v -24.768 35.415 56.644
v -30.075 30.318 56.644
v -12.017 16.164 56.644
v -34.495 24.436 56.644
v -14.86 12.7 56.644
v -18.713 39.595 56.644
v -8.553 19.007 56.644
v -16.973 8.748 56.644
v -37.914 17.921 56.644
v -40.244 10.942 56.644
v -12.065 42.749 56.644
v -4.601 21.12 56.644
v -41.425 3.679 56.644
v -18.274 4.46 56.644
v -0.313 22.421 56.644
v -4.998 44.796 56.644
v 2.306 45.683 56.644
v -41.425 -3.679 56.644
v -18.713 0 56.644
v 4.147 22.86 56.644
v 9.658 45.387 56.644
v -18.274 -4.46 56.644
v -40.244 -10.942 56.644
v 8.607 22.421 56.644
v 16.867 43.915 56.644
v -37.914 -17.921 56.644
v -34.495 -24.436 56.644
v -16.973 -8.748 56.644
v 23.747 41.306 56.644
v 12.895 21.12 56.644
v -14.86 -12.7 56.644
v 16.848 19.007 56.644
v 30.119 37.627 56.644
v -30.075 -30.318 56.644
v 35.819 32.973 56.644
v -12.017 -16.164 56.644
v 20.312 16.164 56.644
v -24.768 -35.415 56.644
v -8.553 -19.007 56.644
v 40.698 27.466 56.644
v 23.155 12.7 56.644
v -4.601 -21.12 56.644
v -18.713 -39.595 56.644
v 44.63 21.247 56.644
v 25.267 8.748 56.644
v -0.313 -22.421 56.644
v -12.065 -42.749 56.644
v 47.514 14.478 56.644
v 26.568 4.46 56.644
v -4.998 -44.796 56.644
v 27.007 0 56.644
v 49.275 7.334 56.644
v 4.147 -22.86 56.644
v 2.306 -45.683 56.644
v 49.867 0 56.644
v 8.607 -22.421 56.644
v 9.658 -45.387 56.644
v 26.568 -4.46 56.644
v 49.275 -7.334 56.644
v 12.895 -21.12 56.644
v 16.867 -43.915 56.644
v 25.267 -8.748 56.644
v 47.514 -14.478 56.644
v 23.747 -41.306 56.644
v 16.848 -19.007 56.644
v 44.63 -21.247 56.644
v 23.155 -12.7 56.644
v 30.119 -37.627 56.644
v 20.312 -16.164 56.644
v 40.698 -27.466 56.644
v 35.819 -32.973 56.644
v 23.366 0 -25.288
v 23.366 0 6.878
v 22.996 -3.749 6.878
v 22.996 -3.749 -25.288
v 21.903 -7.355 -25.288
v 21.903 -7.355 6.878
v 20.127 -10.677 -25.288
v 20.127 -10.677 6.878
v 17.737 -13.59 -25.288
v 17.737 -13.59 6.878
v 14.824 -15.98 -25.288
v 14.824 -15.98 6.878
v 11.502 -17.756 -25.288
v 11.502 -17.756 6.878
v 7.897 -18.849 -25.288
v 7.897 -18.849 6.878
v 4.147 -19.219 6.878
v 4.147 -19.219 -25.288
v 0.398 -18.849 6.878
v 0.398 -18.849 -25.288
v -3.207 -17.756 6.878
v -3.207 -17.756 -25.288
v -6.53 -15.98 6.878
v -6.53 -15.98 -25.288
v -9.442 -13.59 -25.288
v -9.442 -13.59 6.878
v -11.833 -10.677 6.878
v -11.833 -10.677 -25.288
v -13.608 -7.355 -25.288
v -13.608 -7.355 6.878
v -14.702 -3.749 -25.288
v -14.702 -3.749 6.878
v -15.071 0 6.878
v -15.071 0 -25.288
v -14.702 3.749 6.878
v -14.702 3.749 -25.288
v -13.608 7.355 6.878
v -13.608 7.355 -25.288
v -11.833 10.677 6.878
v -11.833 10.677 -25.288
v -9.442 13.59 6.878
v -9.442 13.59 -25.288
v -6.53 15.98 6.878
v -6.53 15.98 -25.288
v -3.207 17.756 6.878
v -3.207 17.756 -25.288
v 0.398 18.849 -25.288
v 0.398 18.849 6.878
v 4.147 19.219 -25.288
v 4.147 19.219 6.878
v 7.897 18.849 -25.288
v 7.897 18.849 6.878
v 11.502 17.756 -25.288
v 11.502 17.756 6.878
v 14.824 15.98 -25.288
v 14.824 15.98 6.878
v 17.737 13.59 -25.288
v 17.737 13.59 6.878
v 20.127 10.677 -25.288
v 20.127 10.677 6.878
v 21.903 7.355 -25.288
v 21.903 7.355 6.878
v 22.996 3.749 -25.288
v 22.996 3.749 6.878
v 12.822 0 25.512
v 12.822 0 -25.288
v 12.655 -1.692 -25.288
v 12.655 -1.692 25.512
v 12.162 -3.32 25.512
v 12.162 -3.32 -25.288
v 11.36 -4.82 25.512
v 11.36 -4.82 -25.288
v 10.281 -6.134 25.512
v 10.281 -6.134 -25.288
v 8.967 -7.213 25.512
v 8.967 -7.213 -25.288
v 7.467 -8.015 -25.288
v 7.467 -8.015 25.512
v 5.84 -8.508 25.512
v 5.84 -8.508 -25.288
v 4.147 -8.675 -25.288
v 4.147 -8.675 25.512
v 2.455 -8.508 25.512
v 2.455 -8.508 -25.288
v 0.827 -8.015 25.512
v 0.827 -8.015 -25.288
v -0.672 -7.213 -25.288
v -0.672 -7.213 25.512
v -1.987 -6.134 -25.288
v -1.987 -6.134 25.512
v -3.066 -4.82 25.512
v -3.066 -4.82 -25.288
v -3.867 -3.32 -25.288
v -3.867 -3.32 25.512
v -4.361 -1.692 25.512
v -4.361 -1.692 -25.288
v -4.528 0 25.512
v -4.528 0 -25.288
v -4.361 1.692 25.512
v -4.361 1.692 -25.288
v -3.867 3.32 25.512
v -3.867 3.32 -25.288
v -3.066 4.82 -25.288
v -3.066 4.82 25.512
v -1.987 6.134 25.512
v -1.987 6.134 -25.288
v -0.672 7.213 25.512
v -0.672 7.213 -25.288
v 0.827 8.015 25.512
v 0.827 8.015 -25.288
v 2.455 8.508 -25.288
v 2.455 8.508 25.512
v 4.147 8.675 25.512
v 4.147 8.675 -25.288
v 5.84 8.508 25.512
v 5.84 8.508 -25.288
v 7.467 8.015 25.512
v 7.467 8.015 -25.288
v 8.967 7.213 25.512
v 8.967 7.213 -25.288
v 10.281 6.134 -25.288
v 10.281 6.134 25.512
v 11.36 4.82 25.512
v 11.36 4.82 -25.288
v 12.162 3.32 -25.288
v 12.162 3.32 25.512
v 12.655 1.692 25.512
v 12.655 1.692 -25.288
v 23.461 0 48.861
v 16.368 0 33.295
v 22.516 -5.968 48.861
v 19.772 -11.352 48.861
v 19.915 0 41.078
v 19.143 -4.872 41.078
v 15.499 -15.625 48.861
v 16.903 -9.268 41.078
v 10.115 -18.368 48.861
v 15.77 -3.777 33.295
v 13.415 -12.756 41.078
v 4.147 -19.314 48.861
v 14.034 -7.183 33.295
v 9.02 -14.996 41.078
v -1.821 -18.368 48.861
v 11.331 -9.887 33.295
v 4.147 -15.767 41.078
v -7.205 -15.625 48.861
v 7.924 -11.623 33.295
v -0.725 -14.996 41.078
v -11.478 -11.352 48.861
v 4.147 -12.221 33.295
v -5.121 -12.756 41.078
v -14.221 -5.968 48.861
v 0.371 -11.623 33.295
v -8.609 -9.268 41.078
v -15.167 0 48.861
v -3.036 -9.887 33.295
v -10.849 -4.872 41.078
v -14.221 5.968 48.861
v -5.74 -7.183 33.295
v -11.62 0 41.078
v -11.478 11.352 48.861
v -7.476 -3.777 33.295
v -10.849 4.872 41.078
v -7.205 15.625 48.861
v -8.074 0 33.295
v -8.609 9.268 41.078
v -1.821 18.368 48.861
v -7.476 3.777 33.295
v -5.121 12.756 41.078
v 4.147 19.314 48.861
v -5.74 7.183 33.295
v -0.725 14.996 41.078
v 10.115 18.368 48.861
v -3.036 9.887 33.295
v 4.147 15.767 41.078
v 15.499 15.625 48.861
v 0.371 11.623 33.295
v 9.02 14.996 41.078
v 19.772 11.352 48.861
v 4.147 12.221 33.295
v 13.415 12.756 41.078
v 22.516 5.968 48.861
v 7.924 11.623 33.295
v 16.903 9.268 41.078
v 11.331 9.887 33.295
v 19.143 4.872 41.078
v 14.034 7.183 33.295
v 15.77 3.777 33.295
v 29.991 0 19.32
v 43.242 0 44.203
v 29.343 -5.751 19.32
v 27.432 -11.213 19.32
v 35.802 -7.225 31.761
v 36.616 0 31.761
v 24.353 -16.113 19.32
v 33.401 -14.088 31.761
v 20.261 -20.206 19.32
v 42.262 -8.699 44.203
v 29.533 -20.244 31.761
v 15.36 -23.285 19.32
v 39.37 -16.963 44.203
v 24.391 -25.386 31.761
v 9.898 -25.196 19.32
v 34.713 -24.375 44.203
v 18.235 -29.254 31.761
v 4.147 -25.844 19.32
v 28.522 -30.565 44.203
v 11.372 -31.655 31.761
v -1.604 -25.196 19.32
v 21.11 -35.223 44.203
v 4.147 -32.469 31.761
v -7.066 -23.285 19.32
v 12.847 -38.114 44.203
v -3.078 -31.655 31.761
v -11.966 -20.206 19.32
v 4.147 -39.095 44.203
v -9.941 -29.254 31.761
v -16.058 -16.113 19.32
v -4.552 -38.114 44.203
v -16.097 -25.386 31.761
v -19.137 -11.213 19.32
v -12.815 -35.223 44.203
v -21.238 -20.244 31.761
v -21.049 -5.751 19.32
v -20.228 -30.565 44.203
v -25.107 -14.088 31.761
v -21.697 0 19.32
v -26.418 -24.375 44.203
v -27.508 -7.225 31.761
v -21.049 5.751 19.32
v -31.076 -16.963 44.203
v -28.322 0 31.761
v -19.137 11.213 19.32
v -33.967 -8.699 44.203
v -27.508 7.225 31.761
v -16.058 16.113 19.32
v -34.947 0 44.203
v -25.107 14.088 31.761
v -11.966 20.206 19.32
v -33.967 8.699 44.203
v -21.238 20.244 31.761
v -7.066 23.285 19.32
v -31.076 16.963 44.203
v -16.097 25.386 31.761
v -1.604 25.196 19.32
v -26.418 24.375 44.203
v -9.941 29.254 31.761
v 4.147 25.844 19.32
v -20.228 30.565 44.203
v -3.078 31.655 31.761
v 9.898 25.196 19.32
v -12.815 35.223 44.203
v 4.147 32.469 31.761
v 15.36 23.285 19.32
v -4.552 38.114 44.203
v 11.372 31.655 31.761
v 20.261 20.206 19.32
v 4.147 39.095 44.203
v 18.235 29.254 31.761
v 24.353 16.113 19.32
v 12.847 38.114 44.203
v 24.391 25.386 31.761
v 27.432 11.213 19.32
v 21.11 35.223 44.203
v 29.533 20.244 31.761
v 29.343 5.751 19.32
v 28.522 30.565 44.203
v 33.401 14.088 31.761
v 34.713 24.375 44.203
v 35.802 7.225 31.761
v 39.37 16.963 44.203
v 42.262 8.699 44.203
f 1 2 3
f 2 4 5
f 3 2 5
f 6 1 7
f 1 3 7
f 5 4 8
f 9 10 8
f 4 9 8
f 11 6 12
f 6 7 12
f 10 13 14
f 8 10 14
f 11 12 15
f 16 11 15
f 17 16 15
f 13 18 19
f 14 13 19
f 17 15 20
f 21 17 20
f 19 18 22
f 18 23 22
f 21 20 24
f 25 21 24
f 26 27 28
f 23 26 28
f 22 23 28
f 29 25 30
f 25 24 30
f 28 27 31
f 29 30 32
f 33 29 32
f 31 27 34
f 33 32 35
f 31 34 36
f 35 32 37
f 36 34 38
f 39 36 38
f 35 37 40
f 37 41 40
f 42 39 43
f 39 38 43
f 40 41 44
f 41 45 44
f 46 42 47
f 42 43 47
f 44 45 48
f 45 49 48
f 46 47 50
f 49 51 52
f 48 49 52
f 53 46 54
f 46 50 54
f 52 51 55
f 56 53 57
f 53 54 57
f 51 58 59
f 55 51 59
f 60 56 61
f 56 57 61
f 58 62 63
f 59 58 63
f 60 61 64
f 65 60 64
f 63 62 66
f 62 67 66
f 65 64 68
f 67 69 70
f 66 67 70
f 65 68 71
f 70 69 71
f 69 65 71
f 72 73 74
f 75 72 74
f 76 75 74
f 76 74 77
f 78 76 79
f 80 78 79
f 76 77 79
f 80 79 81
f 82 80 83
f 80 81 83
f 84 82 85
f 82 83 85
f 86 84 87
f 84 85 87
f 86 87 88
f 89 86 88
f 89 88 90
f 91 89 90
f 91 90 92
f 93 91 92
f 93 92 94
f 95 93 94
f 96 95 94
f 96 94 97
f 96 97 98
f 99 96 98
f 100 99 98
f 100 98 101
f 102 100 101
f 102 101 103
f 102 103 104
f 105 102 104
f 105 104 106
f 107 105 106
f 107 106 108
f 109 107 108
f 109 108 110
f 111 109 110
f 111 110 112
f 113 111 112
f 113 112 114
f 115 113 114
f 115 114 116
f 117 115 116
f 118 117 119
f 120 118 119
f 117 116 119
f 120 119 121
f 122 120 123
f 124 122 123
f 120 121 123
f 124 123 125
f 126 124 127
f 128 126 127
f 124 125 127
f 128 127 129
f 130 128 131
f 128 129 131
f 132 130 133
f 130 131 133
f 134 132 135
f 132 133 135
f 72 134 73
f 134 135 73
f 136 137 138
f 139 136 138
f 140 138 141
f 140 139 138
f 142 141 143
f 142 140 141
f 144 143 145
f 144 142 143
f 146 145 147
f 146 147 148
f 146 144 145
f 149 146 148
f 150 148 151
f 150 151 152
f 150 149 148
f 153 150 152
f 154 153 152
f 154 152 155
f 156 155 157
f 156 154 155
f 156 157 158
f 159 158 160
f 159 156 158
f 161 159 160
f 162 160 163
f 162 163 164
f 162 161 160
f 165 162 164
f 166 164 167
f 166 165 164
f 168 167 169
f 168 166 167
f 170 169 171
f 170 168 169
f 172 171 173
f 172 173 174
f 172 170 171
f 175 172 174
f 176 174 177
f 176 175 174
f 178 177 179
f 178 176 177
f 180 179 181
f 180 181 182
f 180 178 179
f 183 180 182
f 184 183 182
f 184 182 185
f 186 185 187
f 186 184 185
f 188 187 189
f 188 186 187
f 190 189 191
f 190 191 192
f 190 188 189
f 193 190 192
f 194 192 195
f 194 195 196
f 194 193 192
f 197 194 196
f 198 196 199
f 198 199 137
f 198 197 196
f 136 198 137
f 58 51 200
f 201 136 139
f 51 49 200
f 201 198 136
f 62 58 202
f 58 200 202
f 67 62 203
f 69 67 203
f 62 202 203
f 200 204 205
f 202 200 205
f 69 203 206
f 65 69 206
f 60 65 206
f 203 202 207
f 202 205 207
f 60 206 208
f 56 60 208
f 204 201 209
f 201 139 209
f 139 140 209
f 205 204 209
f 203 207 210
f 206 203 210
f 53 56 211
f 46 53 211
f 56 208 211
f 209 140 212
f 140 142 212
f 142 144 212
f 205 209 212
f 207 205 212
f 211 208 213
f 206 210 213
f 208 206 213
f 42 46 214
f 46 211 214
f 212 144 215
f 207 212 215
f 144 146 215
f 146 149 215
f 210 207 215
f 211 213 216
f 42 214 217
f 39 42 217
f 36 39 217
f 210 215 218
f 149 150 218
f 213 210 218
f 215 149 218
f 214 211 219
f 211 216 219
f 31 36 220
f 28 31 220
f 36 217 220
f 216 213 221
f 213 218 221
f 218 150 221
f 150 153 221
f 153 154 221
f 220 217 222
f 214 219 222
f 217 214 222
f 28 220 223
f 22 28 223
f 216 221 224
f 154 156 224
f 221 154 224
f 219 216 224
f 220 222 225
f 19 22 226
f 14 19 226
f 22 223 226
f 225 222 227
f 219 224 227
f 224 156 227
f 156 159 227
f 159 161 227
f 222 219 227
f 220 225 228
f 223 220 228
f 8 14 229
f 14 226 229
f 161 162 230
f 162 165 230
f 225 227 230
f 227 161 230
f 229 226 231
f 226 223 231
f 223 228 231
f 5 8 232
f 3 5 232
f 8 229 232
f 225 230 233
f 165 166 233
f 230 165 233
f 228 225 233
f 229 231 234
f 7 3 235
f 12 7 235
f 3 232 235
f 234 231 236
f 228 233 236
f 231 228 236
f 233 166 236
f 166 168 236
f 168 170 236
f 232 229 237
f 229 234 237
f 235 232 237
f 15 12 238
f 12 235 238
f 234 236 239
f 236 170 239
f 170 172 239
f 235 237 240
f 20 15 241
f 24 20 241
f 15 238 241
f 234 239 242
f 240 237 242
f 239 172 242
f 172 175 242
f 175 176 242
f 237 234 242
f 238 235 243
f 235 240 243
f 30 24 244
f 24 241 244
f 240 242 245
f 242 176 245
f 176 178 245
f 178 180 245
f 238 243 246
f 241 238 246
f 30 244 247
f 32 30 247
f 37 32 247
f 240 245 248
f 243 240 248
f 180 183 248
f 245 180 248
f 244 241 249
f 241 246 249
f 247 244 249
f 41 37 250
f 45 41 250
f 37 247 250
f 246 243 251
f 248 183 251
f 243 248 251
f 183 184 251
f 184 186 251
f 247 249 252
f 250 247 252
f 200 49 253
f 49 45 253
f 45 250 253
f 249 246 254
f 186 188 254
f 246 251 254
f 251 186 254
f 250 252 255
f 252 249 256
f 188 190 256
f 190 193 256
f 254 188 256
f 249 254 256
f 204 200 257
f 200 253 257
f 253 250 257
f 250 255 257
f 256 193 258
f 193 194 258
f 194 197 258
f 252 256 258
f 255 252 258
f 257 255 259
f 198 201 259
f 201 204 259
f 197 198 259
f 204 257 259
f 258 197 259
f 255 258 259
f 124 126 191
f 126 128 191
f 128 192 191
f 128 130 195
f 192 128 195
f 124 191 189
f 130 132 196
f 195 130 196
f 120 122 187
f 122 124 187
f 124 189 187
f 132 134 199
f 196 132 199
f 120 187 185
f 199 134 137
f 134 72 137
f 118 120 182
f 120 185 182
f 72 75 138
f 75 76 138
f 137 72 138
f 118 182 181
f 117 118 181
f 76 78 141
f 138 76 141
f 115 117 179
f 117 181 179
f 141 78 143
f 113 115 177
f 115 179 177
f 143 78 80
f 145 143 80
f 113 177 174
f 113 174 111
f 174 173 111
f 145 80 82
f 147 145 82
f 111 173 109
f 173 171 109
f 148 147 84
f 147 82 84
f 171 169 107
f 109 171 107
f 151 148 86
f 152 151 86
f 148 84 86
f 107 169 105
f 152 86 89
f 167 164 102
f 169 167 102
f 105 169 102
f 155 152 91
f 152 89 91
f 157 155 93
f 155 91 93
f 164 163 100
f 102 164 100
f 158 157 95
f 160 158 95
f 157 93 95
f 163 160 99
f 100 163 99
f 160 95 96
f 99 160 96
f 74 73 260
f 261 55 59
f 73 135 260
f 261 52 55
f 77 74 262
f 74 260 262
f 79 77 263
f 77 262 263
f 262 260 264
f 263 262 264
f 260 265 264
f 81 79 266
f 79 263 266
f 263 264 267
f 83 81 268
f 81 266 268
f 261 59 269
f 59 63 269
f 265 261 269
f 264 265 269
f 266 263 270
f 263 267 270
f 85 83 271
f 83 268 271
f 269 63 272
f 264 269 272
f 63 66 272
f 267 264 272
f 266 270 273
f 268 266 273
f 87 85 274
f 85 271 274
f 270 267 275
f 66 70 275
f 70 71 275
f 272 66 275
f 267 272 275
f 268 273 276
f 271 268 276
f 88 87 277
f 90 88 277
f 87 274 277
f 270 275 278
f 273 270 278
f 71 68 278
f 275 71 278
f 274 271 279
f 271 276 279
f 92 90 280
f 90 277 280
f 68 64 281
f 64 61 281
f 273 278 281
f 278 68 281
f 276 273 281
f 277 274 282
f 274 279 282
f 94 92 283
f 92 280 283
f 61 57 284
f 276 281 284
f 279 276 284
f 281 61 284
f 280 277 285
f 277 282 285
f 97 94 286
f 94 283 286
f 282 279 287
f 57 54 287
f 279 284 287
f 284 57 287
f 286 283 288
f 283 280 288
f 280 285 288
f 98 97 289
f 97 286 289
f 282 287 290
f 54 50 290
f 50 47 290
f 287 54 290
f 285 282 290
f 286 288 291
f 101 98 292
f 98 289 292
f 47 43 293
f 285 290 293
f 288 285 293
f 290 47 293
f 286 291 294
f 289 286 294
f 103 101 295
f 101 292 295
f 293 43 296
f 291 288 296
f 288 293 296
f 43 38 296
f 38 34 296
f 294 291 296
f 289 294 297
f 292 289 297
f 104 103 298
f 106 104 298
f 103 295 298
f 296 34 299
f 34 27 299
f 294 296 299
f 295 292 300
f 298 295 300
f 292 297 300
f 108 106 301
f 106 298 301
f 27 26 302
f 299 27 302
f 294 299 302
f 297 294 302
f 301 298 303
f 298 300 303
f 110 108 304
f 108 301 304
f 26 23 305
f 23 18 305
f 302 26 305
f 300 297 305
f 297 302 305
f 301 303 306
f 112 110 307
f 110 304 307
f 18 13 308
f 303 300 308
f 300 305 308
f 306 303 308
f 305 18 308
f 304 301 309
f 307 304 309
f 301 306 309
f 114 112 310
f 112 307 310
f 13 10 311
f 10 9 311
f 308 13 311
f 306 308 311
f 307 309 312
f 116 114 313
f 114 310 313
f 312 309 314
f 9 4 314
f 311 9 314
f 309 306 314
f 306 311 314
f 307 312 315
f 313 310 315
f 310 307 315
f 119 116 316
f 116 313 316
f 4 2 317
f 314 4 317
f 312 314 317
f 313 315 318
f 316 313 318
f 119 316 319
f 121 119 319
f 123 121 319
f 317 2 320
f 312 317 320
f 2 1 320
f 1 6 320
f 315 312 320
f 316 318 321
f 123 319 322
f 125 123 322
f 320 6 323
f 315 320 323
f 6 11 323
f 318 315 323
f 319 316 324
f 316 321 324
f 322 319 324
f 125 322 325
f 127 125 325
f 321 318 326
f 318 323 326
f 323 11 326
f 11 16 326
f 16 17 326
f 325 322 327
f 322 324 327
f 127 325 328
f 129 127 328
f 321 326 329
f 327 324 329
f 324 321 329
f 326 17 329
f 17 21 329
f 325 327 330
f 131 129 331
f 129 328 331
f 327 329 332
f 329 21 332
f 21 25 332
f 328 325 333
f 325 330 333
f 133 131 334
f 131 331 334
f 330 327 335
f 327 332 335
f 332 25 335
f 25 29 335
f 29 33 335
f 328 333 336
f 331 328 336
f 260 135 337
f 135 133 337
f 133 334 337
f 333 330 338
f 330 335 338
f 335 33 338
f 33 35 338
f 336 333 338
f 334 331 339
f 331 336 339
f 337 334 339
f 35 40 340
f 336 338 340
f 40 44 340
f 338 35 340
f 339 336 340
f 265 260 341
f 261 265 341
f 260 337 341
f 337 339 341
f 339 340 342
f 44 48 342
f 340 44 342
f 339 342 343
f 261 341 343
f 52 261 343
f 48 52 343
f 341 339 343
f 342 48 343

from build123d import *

# Parameters (mm, degrees)
F2_DEPTH = 50.8
F3_DEPTH = 50.8


with BuildPart() as f1:
    # F0 (on Front) → F1 (revolve)
    with BuildSketch(Plane.XZ):
        Polygon((27.0071681589, 56.6442497075), (4.1471673176, 6.4736288041), (4.1471673176, -25.28761141), (23.3657527715, -25.28761141), (23.3657527715, 6.8782302551), (49.8671717942, 56.6442497075), align=None)
    revolve(axis=Axis((4.1471673176, 0, -9.406991303), (0, 0, -1)))

    # F2 (cut): a face of the model
    f2_faces = [f1.faces().sort_by_distance(p)[0] for p in [
        (4.1471673176, 0, -25.28761141),
    ]]
    extrude(f2_faces, amount=-F2_DEPTH, mode=Mode.SUBTRACT)

    # F3 (add): a face of the model
    f3_faces = [f1.faces().sort_by_distance(p)[0] for p in [
        (-14.5278344524, 0, 25.51238859),
    ]]
    extrude(f3_faces, amount=F3_DEPTH)


solid = f1.part
